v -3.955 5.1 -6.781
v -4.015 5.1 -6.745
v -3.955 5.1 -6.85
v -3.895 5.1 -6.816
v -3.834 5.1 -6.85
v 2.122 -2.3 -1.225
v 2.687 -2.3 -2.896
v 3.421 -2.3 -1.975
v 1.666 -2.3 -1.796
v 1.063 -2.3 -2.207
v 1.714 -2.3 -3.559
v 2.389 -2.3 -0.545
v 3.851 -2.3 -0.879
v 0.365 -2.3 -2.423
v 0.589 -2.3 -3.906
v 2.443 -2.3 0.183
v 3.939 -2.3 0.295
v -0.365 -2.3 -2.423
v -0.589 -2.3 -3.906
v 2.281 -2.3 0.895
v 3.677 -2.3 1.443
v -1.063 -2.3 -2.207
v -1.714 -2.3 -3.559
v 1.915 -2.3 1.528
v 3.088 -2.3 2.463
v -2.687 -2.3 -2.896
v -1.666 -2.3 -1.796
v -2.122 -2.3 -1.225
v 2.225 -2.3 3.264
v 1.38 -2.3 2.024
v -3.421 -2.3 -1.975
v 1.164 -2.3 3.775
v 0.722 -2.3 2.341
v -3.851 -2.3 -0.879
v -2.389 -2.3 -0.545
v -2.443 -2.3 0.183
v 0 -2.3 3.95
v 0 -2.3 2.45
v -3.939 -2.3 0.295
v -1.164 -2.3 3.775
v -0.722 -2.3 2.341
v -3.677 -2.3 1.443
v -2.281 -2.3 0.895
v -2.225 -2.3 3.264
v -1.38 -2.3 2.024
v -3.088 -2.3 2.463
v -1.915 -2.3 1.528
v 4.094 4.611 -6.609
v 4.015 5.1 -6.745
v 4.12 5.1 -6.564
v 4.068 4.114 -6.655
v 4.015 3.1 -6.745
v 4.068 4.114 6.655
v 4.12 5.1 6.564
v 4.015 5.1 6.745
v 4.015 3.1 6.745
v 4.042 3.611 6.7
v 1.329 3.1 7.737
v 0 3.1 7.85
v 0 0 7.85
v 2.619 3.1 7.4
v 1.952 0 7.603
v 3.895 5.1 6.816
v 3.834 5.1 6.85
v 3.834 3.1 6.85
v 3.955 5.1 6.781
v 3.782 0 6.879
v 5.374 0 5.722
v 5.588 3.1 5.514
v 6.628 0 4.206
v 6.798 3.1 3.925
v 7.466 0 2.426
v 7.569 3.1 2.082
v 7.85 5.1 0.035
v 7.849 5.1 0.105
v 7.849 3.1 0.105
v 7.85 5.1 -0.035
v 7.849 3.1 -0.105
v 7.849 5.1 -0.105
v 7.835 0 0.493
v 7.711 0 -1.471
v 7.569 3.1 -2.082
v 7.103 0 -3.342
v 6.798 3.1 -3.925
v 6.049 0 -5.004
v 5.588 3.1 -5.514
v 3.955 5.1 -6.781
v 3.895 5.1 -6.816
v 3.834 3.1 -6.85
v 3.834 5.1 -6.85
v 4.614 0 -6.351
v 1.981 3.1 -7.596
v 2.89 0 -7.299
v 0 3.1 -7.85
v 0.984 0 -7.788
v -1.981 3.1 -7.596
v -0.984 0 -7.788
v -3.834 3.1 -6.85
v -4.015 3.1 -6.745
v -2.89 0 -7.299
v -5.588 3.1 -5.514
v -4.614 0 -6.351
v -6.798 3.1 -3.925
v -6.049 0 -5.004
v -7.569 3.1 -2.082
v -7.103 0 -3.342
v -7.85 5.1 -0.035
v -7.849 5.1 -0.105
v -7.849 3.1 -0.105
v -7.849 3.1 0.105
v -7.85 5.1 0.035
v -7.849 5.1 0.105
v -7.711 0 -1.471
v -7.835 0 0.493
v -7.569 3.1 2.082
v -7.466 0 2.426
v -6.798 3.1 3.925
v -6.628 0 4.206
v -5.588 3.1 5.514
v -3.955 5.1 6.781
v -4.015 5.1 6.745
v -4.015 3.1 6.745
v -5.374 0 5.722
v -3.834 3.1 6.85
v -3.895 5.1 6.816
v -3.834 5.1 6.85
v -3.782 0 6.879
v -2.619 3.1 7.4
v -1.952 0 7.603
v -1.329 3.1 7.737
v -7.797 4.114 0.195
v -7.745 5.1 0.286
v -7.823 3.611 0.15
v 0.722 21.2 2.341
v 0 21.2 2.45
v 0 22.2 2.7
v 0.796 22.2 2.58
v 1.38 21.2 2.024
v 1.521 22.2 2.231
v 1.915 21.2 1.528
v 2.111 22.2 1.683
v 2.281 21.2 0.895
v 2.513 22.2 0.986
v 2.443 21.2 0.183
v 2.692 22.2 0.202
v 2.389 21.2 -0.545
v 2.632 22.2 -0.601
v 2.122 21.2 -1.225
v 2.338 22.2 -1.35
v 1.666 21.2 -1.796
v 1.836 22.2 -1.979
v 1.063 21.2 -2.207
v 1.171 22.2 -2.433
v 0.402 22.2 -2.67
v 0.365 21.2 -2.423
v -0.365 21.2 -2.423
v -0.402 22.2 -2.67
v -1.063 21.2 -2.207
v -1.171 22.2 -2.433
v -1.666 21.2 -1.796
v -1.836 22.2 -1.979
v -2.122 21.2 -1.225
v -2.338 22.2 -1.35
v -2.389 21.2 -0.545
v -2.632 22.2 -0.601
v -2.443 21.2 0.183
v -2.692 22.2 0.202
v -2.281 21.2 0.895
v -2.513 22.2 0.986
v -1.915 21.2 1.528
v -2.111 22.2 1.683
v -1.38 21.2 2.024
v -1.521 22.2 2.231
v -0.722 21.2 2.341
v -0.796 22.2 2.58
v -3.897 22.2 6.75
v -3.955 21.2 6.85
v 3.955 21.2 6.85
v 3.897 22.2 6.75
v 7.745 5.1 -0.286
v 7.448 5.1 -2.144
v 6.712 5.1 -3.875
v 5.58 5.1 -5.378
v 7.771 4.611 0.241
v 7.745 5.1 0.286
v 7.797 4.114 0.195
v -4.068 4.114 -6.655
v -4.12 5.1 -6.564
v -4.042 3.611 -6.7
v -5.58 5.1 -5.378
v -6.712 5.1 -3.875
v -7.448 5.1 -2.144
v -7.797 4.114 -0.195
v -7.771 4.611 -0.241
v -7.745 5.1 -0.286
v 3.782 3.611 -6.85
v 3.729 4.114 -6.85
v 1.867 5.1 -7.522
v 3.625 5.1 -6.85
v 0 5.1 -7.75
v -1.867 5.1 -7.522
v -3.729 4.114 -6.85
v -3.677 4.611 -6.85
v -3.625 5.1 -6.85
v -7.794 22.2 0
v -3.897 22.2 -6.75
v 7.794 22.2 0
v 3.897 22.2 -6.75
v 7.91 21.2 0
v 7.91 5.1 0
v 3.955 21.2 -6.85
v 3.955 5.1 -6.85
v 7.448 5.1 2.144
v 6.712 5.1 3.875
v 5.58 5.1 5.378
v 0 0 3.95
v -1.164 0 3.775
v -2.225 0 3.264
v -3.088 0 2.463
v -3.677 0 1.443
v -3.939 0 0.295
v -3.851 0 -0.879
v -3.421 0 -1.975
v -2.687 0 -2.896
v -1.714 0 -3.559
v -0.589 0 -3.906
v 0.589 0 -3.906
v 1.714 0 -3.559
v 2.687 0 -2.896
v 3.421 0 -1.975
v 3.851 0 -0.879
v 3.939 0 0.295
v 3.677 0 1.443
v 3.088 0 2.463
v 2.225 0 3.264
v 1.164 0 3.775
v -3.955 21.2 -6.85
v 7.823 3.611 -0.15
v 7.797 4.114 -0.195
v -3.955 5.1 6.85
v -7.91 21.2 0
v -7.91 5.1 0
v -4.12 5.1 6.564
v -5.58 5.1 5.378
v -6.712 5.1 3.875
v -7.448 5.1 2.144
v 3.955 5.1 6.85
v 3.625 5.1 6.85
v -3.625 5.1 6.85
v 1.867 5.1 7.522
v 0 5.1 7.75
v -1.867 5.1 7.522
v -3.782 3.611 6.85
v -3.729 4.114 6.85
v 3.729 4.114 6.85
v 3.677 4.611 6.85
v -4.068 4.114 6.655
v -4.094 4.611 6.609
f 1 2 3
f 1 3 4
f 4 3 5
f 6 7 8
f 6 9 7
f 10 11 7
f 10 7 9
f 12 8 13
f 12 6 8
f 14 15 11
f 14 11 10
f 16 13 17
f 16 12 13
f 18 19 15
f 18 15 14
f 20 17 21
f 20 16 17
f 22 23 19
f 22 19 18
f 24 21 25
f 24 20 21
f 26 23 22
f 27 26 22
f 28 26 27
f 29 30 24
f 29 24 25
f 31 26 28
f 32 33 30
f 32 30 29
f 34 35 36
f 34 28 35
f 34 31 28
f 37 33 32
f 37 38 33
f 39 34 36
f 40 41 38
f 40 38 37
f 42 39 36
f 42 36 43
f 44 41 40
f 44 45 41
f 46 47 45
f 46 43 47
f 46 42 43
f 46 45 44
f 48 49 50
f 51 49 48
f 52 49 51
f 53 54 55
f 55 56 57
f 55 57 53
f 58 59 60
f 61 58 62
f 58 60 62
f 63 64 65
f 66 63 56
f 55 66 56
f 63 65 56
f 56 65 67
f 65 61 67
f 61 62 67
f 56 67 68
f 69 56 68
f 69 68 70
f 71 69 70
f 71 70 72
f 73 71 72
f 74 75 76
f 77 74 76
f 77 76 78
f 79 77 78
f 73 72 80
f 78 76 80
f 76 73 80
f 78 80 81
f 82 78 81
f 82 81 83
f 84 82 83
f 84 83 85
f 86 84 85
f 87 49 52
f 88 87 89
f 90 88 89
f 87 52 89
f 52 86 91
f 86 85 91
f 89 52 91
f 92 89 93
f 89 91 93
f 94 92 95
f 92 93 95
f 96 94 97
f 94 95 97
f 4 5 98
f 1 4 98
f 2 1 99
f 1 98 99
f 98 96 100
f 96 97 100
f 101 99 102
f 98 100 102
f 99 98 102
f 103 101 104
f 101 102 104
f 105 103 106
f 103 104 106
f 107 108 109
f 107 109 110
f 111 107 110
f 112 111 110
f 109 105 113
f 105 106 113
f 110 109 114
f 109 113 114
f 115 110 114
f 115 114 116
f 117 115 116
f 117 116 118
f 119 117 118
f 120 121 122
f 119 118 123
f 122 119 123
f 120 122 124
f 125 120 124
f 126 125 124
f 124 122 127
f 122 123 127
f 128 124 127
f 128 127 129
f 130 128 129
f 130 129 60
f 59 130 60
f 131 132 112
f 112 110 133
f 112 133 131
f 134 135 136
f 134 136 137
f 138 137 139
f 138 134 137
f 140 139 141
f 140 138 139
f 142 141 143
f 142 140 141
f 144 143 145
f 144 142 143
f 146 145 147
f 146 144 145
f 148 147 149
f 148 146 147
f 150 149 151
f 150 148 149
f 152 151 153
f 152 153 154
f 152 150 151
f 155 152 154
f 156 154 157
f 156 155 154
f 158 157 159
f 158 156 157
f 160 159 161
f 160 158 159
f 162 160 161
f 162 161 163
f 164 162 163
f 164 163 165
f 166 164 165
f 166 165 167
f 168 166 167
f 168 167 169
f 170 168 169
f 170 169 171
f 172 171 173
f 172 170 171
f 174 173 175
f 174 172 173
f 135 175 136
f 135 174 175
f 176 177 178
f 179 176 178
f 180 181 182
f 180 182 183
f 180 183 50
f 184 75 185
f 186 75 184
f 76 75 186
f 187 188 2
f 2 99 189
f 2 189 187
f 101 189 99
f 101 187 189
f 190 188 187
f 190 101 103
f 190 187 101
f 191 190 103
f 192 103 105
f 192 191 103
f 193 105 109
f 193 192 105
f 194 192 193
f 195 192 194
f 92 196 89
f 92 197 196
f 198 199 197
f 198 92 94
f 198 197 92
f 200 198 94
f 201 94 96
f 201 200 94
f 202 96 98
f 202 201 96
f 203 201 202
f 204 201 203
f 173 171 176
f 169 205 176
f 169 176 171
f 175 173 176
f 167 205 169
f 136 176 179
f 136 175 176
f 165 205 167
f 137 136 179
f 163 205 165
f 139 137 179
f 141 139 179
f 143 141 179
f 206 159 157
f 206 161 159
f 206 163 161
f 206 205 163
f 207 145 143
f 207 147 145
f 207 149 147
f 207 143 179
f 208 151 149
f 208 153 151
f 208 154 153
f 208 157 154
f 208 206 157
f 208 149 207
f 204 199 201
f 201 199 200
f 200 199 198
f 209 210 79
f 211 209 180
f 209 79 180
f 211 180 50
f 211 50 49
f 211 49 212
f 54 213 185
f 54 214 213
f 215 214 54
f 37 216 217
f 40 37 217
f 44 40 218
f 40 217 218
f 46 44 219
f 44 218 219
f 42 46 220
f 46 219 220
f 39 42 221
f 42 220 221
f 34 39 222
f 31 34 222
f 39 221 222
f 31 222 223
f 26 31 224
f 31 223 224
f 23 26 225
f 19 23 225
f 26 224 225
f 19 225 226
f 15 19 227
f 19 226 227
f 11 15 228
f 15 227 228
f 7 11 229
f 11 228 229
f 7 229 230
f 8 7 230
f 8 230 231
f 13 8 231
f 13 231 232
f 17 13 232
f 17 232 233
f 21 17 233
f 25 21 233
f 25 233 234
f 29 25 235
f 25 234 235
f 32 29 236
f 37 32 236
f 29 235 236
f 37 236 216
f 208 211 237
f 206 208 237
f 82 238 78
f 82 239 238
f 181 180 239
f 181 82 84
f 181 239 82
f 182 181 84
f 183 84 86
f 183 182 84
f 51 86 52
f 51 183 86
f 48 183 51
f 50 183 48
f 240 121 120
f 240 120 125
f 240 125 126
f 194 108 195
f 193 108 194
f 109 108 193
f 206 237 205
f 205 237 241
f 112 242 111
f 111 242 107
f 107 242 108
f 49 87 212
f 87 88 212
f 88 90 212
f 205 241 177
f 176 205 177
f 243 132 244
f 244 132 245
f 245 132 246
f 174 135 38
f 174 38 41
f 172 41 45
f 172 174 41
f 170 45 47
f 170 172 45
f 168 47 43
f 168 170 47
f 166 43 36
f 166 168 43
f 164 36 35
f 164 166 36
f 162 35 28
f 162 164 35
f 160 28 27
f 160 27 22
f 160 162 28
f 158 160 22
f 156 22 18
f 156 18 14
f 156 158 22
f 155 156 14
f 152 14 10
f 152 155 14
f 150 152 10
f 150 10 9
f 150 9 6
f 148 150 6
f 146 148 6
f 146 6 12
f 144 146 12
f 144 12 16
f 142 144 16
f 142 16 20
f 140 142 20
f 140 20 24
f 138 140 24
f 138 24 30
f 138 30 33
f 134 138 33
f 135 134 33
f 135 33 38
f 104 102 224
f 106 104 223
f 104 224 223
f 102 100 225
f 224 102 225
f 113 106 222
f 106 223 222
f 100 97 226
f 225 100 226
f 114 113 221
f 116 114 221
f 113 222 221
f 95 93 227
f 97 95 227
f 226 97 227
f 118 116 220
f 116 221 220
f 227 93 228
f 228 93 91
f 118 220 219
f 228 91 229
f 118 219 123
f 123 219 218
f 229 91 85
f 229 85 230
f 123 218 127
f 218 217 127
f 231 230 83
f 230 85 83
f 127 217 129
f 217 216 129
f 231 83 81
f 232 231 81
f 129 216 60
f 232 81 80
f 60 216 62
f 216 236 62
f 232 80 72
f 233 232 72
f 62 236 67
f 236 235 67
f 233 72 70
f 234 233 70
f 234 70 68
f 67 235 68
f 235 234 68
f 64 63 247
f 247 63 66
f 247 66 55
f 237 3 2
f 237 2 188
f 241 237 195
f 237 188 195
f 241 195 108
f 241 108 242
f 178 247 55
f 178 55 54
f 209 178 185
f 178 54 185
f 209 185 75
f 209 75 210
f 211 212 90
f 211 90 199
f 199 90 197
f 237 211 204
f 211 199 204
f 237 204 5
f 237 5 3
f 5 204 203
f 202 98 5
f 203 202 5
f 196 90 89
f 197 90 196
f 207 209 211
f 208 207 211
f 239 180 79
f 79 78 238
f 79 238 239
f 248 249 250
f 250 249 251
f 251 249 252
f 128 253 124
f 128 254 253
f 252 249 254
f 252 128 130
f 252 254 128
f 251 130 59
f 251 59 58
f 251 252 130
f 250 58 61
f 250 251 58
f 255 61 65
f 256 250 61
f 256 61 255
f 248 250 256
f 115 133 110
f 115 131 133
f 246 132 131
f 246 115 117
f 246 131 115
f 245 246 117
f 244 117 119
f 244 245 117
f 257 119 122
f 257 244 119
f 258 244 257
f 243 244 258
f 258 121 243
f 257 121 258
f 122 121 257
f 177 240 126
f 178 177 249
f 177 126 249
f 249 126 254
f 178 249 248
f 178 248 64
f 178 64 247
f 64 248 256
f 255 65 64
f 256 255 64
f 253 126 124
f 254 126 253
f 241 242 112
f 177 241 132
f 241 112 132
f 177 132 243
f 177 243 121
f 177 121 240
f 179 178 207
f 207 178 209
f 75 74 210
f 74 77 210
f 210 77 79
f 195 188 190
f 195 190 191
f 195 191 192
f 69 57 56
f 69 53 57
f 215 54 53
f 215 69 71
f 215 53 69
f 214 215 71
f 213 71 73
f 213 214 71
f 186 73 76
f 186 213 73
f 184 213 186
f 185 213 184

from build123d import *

# Parameters (mm, degrees)
SKETCH1_R           = 7.85
BOSS_EXTRUDE1_DEPTH = 5.1
BOSS_EXTRUDE2_DEPTH = 17.1
CHAMFER1_SIZE       = 2
CHAMFER1_SIZE_2     = 0.1
CHAMFER2_SIZE       = 0.1
CHAMFER2_SIZE2      = 1
SKETCH3_R           = 2.45
CUT_EXTRUDE1_DEPTH  = 25.840004697
SKETCH4_R           = 3.95
SKETCH4_R_2         = 2.45
BOSS_EXTRUDE3_DEPTH = 2.3
CHAMFER4_SIZE       = 0.25
CHAMFER4_SIZE2      = 1


with BuildPart() as part:
    # Sketch1 → Boss-Extrude1 (new body)
    with BuildSketch(Plane(origin=(0, 0, 0), x_dir=(1, 0, 0), z_dir=(0, 1, 0))):
        with Locations(Location((0, 0, 0), (0, 0, 270))):
            Circle(SKETCH1_R)
    extrude(amount=BOSS_EXTRUDE1_DEPTH)

    # Sketch2 → Boss-Extrude2 (add)
    with BuildSketch(Plane(origin=(0, 5.1, 0), x_dir=(1, 0, 0), z_dir=(0, 1, 0))):
        Polygon((3.954849344, -6.85), (7.909698688, 0), (3.954849344, 6.85), (-3.954849344, 6.85), (-7.909698688, 0), (-3.954849344, -6.85), align=None)
    extrude(amount=BOSS_EXTRUDE2_DEPTH)

    # Chamfer1
    # the kernel refuses this chamfer: 2, 0.1 mm, written as the material it takes off along each edge
    with BuildSketch(Plane(origin=(0, 5.1, 0), x_dir=(-0.12524723845316335, 0, 0.9921255612370121), z_dir=(-0.9921255612370121, 0, -0.12524723845316335))) as chamfer1_piece_1_section:
        Polygon((7.85, -CHAMFER1_SIZE), (7.85 - CHAMFER1_SIZE_2, 0), (7.85, 0), align=None)
    chamfer1_piece_1 = revolve(axis=Axis((0, 5.1, 0), (0, 1, 0)), revolution_arc=134.390067419, mode=Mode.PRIVATE)
    chamfer1_piece_1 = split(chamfer1_piece_1, bisect_by=Plane(origin=(1.492584192, 4.100393964, 6.85), z_dir=(0, 0, 1)), keep=Keep.TOP, mode=Mode.PRIVATE)
    add(chamfer1_piece_1, mode=Mode.SUBTRACT)
    with BuildSketch(Plane(origin=(0, 5.1, 0), x_dir=(-0.12524723845316335, 0, 0.9921255612370121), z_dir=(-0.9921255612370121, 0, -0.12524723845316335))) as chamfer1_piece_2_section:
        Polygon((7.85, -CHAMFER1_SIZE), (7.85 - CHAMFER1_SIZE_2, 0), (7.85, 0), align=None)
    chamfer1_piece_2 = revolve(axis=Axis((0, 5.1, 0), (0, 1, 0)), revolution_arc=134.390067419, mode=Mode.PRIVATE)
    chamfer1_piece_2 = split(chamfer1_piece_2, bisect_by=Plane(origin=(5.932274016, 4.100460799, 3.425), z_dir=(0.8660254037844386, 0, 0.5000000000000001)), keep=Keep.TOP, mode=Mode.PRIVATE)
    add(chamfer1_piece_2, mode=Mode.SUBTRACT)
    with BuildSketch(Plane(origin=(0, 5.1, 0), x_dir=(-0.12524723845316335, 0, 0.9921255612370121), z_dir=(-0.9921255612370121, 0, -0.12524723845316335))) as chamfer1_piece_3_section:
        Polygon((7.85, -CHAMFER1_SIZE), (7.85 - CHAMFER1_SIZE_2, 0), (7.85, 0), align=None)
    chamfer1_piece_3 = revolve(axis=Axis((0, 5.1, 0), (0, 1, 0)), revolution_arc=134.390067419, mode=Mode.PRIVATE)
    chamfer1_piece_3 = split(chamfer1_piece_3, bisect_by=Plane(origin=(6.678566112, 4.100393964, -2.132384173), z_dir=(0.8660254037844385, 0, -0.5000000000000003)), keep=Keep.TOP, mode=Mode.PRIVATE)
    add(chamfer1_piece_3, mode=Mode.SUBTRACT)
    with BuildSketch(Plane(origin=(0, 5.1, 0), x_dir=(0.796582320548557, 0, 0.6045300708728027), z_dir=(-0.6045300708728027, 0, 0.796582320548557))) as chamfer1_piece_4_section:
        Polygon((7.85, -CHAMFER1_SIZE), (7.85 - CHAMFER1_SIZE_2, 0), (7.85, 0), align=None)
    chamfer1_piece_4 = revolve(axis=Axis((0, 5.1, 0), (0, 1, 0)), revolution_arc=134.390067419, mode=Mode.PRIVATE)
    chamfer1_piece_4 = split(chamfer1_piece_4, bisect_by=Plane(origin=(6.678566112, 4.100393964, 2.132384173), z_dir=(0.8660254037844386, 0, 0.5000000000000001)), keep=Keep.TOP, mode=Mode.PRIVATE)
    add(chamfer1_piece_4, mode=Mode.SUBTRACT)
    with BuildSketch(Plane(origin=(0, 5.1, 0), x_dir=(0.796582320548557, 0, 0.6045300708728027), z_dir=(-0.6045300708728027, 0, 0.796582320548557))) as chamfer1_piece_5_section:
        Polygon((7.85, -CHAMFER1_SIZE), (7.85 - CHAMFER1_SIZE_2, 0), (7.85, 0), align=None)
    chamfer1_piece_5 = revolve(axis=Axis((0, 5.1, 0), (0, 1, 0)), revolution_arc=134.390067419, mode=Mode.PRIVATE)
    chamfer1_piece_5 = split(chamfer1_piece_5, bisect_by=Plane(origin=(5.932274016, 4.100460799, -3.425), z_dir=(0.8660254037844385, 0, -0.5000000000000003)), keep=Keep.TOP, mode=Mode.PRIVATE)
    add(chamfer1_piece_5, mode=Mode.SUBTRACT)
    with BuildSketch(Plane(origin=(0, 5.1, 0), x_dir=(0.796582320548557, 0, 0.6045300708728027), z_dir=(-0.6045300708728027, 0, 0.796582320548557))) as chamfer1_piece_6_section:
        Polygon((7.85, -CHAMFER1_SIZE), (7.85 - CHAMFER1_SIZE_2, 0), (7.85, 0), align=None)
    chamfer1_piece_6 = revolve(axis=Axis((0, 5.1, 0), (0, 1, 0)), revolution_arc=134.390067419, mode=Mode.PRIVATE)
    chamfer1_piece_6 = split(chamfer1_piece_6, bisect_by=Plane(origin=(1.492584192, 4.100393964, -6.85), z_dir=(0, 0, -1)), keep=Keep.TOP, mode=Mode.PRIVATE)
    add(chamfer1_piece_6, mode=Mode.SUBTRACT)
    with BuildSketch(Plane(origin=(0, 5.1, 0), x_dir=(0.9218295590017263, 0, -0.3875954903642235), z_dir=(0.3875954903642235, 0, 0.9218295590017263))) as chamfer1_piece_7_section:
        Polygon((7.85, -CHAMFER1_SIZE), (7.85 - CHAMFER1_SIZE_2, 0), (7.85, 0), align=None)
    chamfer1_piece_7 = revolve(axis=Axis((0, 5.1, 0), (0, 1, 0)), revolution_arc=134.390067419, mode=Mode.PRIVATE)
    chamfer1_piece_7 = split(chamfer1_piece_7, bisect_by=Plane(origin=(5.18598192, 4.100393964, -4.717615827), z_dir=(0.8660254037844385, 0, -0.5000000000000003)), keep=Keep.TOP, mode=Mode.PRIVATE)
    add(chamfer1_piece_7, mode=Mode.SUBTRACT)
    with BuildSketch(Plane(origin=(0, 5.1, 0), x_dir=(0.9218295590017263, 0, -0.3875954903642235), z_dir=(0.3875954903642235, 0, 0.9218295590017263))) as chamfer1_piece_8_section:
        Polygon((7.85, -CHAMFER1_SIZE), (7.85 - CHAMFER1_SIZE_2, 0), (7.85, 0), align=None)
    chamfer1_piece_8 = revolve(axis=Axis((0, 5.1, 0), (0, 1, 0)), revolution_arc=134.390067419, mode=Mode.PRIVATE)
    chamfer1_piece_8 = split(chamfer1_piece_8, bisect_by=Plane(origin=(0, 4.100460799, -6.85), z_dir=(0, 0, -1)), keep=Keep.TOP, mode=Mode.PRIVATE)
    add(chamfer1_piece_8, mode=Mode.SUBTRACT)
    with BuildSketch(Plane(origin=(0, 5.1, 0), x_dir=(0.9218295590017263, 0, -0.3875954903642235), z_dir=(0.3875954903642235, 0, 0.9218295590017263))) as chamfer1_piece_9_section:
        Polygon((7.85, -CHAMFER1_SIZE), (7.85 - CHAMFER1_SIZE_2, 0), (7.85, 0), align=None)
    chamfer1_piece_9 = revolve(axis=Axis((0, 5.1, 0), (0, 1, 0)), revolution_arc=134.390067419, mode=Mode.PRIVATE)
    chamfer1_piece_9 = split(chamfer1_piece_9, bisect_by=Plane(origin=(-5.18598192, 4.100393964, -4.717615827), z_dir=(-0.8660254037844387, 0, -0.49999999999999994)), keep=Keep.TOP, mode=Mode.PRIVATE)
    add(chamfer1_piece_9, mode=Mode.SUBTRACT)
    with BuildSketch(Plane(origin=(0, 5.1, 0), x_dir=(0.12524723845316238, 0, -0.9921255612370122), z_dir=(0.9921255612370122, 0, 0.12524723845316238))) as chamfer1_piece_10_section:
        Polygon((7.85, -CHAMFER1_SIZE), (7.85 - CHAMFER1_SIZE_2, 0), (7.85, 0), align=None)
    chamfer1_piece_10 = revolve(axis=Axis((0, 5.1, 0), (0, 1, 0)), revolution_arc=134.390067419, mode=Mode.PRIVATE)
    chamfer1_piece_10 = split(chamfer1_piece_10, bisect_by=Plane(origin=(-1.492584192, 4.100393964, -6.85), z_dir=(0, 0, -1)), keep=Keep.TOP, mode=Mode.PRIVATE)
    add(chamfer1_piece_10, mode=Mode.SUBTRACT)
    with BuildSketch(Plane(origin=(0, 5.1, 0), x_dir=(0.12524723845316238, 0, -0.9921255612370122), z_dir=(0.9921255612370122, 0, 0.12524723845316238))) as chamfer1_piece_11_section:
        Polygon((7.85, -CHAMFER1_SIZE), (7.85 - CHAMFER1_SIZE_2, 0), (7.85, 0), align=None)
    chamfer1_piece_11 = revolve(axis=Axis((0, 5.1, 0), (0, 1, 0)), revolution_arc=134.390067419, mode=Mode.PRIVATE)
    chamfer1_piece_11 = split(chamfer1_piece_11, bisect_by=Plane(origin=(-5.932274016, 4.100460799, -3.425), z_dir=(-0.8660254037844387, 0, -0.49999999999999994)), keep=Keep.TOP, mode=Mode.PRIVATE)
    add(chamfer1_piece_11, mode=Mode.SUBTRACT)
    with BuildSketch(Plane(origin=(0, 5.1, 0), x_dir=(0.12524723845316238, 0, -0.9921255612370122), z_dir=(0.9921255612370122, 0, 0.12524723845316238))) as chamfer1_piece_12_section:
        Polygon((7.85, -CHAMFER1_SIZE), (7.85 - CHAMFER1_SIZE_2, 0), (7.85, 0), align=None)
    chamfer1_piece_12 = revolve(axis=Axis((0, 5.1, 0), (0, 1, 0)), revolution_arc=134.390067419, mode=Mode.PRIVATE)
    chamfer1_piece_12 = split(chamfer1_piece_12, bisect_by=Plane(origin=(-6.678566112, 4.100393964, 2.132384173), z_dir=(-0.8660254037844386, 0, 0.5000000000000001)), keep=Keep.TOP, mode=Mode.PRIVATE)
    add(chamfer1_piece_12, mode=Mode.SUBTRACT)
    with BuildSketch(Plane(origin=(0, 5.1, 0), x_dir=(-0.7965823205485564, 0, -0.6045300708728035), z_dir=(0.6045300708728035, 0, -0.7965823205485564))) as chamfer1_piece_13_section:
        Polygon((7.85, -CHAMFER1_SIZE), (7.85 - CHAMFER1_SIZE_2, 0), (7.85, 0), align=None)
    chamfer1_piece_13 = revolve(axis=Axis((0, 5.1, 0), (0, 1, 0)), revolution_arc=134.390067419, mode=Mode.PRIVATE)
    chamfer1_piece_13 = split(chamfer1_piece_13, bisect_by=Plane(origin=(-6.678566112, 4.100393964, -2.132384173), z_dir=(-0.8660254037844387, 0, -0.49999999999999994)), keep=Keep.TOP, mode=Mode.PRIVATE)
    add(chamfer1_piece_13, mode=Mode.SUBTRACT)
    with BuildSketch(Plane(origin=(0, 5.1, 0), x_dir=(-0.7965823205485564, 0, -0.6045300708728035), z_dir=(0.6045300708728035, 0, -0.7965823205485564))) as chamfer1_piece_14_section:
        Polygon((7.85, -CHAMFER1_SIZE), (7.85 - CHAMFER1_SIZE_2, 0), (7.85, 0), align=None)
    chamfer1_piece_14 = revolve(axis=Axis((0, 5.1, 0), (0, 1, 0)), revolution_arc=134.390067419, mode=Mode.PRIVATE)
    chamfer1_piece_14 = split(chamfer1_piece_14, bisect_by=Plane(origin=(-5.932274016, 4.100460799, 3.425), z_dir=(-0.8660254037844386, 0, 0.5000000000000001)), keep=Keep.TOP, mode=Mode.PRIVATE)
    add(chamfer1_piece_14, mode=Mode.SUBTRACT)
    with BuildSketch(Plane(origin=(0, 5.1, 0), x_dir=(-0.7965823205485564, 0, -0.6045300708728035), z_dir=(0.6045300708728035, 0, -0.7965823205485564))) as chamfer1_piece_15_section:
        Polygon((7.85, -CHAMFER1_SIZE), (7.85 - CHAMFER1_SIZE_2, 0), (7.85, 0), align=None)
    chamfer1_piece_15 = revolve(axis=Axis((0, 5.1, 0), (0, 1, 0)), revolution_arc=134.390067419, mode=Mode.PRIVATE)
    chamfer1_piece_15 = split(chamfer1_piece_15, bisect_by=Plane(origin=(-1.492584192, 4.100393964, 6.85), z_dir=(0, 0, 1)), keep=Keep.TOP, mode=Mode.PRIVATE)
    add(chamfer1_piece_15, mode=Mode.SUBTRACT)
    with BuildSketch(Plane(origin=(0, 5.1, 0), x_dir=(-0.9217969096478654, 0, 0.38767313211473), z_dir=(-0.38767313211473, 0, -0.9217969096478654))) as chamfer1_piece_16_section:
        Polygon((7.85, -CHAMFER1_SIZE), (7.85 - CHAMFER1_SIZE_2, 0), (7.85, 0), align=None)
    chamfer1_piece_16 = revolve(axis=Axis((0, 5.1, 0), (0, 1, 0)), revolution_arc=67.190207846, mode=Mode.PRIVATE)
    chamfer1_piece_16 = split(chamfer1_piece_16, bisect_by=Plane(origin=(-5.185820577, 4.100393946, 4.717895281), z_dir=(-0.8660254037844386, 0, 0.5000000000000001)), keep=Keep.TOP, mode=Mode.PRIVATE)
    add(chamfer1_piece_16, mode=Mode.SUBTRACT)
    with BuildSketch(Plane(origin=(0, 5.1, 0), x_dir=(-0.9217969096478654, 0, 0.38767313211473), z_dir=(-0.38767313211473, 0, -0.9217969096478654))) as chamfer1_piece_17_section:
        Polygon((7.85, -CHAMFER1_SIZE), (7.85 - CHAMFER1_SIZE_2, 0), (7.85, 0), align=None)
    chamfer1_piece_17 = revolve(axis=Axis((0, 5.1, 0), (0, 1, 0)), revolution_arc=67.190207846, mode=Mode.PRIVATE)
    chamfer1_piece_17 = split(chamfer1_piece_17, bisect_by=Plane(origin=(-1.970388485, 4.100365736, 6.85), z_dir=(0, 0, 1)), keep=Keep.TOP, mode=Mode.PRIVATE)
    add(chamfer1_piece_17, mode=Mode.SUBTRACT)
    with BuildSketch(Plane(origin=(0, 5.1, 0), x_dir=(0, 0, 1), z_dir=(-1, 0, 0))) as chamfer1_piece_18_section:
        Polygon((7.85, -CHAMFER1_SIZE), (7.85 - CHAMFER1_SIZE_2, 0), (7.85, 0), align=None)
    chamfer1_piece_18 = revolve(axis=Axis((0, 5.1, 0), (0, 1, 0)), revolution_arc=67.190207846, mode=Mode.PRIVATE)
    chamfer1_piece_18 = split(chamfer1_piece_18, bisect_by=Plane(origin=(1.970388485, 4.100365736, 6.85), z_dir=(0, 0, 1)), keep=Keep.TOP, mode=Mode.PRIVATE)
    add(chamfer1_piece_18, mode=Mode.SUBTRACT)
    with BuildSketch(Plane(origin=(0, 5.1, 0), x_dir=(0, 0, 1), z_dir=(-1, 0, 0))) as chamfer1_piece_19_section:
        Polygon((7.85, -CHAMFER1_SIZE), (7.85 - CHAMFER1_SIZE_2, 0), (7.85, 0), align=None)
    chamfer1_piece_19 = revolve(axis=Axis((0, 5.1, 0), (0, 1, 0)), revolution_arc=67.190207846, mode=Mode.PRIVATE)
    chamfer1_piece_19 = split(chamfer1_piece_19, bisect_by=Plane(origin=(5.185820577, 4.100393946, 4.717895281), z_dir=(0.8660254037844386, 0, 0.5000000000000001)), keep=Keep.TOP, mode=Mode.PRIVATE)
    add(chamfer1_piece_19, mode=Mode.SUBTRACT)

    # Chamfer2
    chamfer2_edges = [part.edges().sort_by_distance(p)[0] for p in [
        (-5.932274016, 22.2, 3.425),
        (-5.932274016, 22.2, -3.425),
        (0, 22.2, -6.85),
        (5.932274016, 22.2, -3.425),
        (5.932274016, 22.2, 3.425),
        (0, 22.2, 6.85),
    ]]
    chamfer2_side = [part.faces().sort_by_distance(p)[0] for p in [
        (0, 22.2, 0),
    ]]
    chamfer(chamfer2_edges, length=CHAMFER2_SIZE, length2=CHAMFER2_SIZE2, reference=chamfer2_side[0])

    # Sketch3 → Cut-Extrude1 (cut, through all)
    with BuildSketch(Plane(origin=(0, 22.2, 0), x_dir=(1, 0, 0), z_dir=(0, 1, 0))):
        with Locations(Location((0, 0, 0), (0, 0, 270))):
            Circle(SKETCH3_R)
    extrude(amount=-CUT_EXTRUDE1_DEPTH, mode=Mode.SUBTRACT)

    # Sketch4 → Boss-Extrude3 (add)
    with BuildSketch(Plane.XZ):
        with Locations(Location((0, 0, 0), (0, 0, 90))):
            Circle(SKETCH4_R)
        with Locations(Location((0, 0, 0), (0, 0, 90))):
            Circle(SKETCH4_R_2, mode=Mode.SUBTRACT)
    extrude(amount=BOSS_EXTRUDE3_DEPTH)

    # Chamfer4
    chamfer4_edges = [part.edges().sort_by_distance(p)[0] for p in [
        (0, 22.2, -2.45),
    ]]
    chamfer4_side = [part.faces().sort_by_distance(p)[0] for p in [
        (-5.667083262, 22.2, 3.271892047),
    ]]
    chamfer(chamfer4_edges, length=CHAMFER4_SIZE, length2=CHAMFER4_SIZE2, reference=chamfer4_side[0])


solid = part.part
